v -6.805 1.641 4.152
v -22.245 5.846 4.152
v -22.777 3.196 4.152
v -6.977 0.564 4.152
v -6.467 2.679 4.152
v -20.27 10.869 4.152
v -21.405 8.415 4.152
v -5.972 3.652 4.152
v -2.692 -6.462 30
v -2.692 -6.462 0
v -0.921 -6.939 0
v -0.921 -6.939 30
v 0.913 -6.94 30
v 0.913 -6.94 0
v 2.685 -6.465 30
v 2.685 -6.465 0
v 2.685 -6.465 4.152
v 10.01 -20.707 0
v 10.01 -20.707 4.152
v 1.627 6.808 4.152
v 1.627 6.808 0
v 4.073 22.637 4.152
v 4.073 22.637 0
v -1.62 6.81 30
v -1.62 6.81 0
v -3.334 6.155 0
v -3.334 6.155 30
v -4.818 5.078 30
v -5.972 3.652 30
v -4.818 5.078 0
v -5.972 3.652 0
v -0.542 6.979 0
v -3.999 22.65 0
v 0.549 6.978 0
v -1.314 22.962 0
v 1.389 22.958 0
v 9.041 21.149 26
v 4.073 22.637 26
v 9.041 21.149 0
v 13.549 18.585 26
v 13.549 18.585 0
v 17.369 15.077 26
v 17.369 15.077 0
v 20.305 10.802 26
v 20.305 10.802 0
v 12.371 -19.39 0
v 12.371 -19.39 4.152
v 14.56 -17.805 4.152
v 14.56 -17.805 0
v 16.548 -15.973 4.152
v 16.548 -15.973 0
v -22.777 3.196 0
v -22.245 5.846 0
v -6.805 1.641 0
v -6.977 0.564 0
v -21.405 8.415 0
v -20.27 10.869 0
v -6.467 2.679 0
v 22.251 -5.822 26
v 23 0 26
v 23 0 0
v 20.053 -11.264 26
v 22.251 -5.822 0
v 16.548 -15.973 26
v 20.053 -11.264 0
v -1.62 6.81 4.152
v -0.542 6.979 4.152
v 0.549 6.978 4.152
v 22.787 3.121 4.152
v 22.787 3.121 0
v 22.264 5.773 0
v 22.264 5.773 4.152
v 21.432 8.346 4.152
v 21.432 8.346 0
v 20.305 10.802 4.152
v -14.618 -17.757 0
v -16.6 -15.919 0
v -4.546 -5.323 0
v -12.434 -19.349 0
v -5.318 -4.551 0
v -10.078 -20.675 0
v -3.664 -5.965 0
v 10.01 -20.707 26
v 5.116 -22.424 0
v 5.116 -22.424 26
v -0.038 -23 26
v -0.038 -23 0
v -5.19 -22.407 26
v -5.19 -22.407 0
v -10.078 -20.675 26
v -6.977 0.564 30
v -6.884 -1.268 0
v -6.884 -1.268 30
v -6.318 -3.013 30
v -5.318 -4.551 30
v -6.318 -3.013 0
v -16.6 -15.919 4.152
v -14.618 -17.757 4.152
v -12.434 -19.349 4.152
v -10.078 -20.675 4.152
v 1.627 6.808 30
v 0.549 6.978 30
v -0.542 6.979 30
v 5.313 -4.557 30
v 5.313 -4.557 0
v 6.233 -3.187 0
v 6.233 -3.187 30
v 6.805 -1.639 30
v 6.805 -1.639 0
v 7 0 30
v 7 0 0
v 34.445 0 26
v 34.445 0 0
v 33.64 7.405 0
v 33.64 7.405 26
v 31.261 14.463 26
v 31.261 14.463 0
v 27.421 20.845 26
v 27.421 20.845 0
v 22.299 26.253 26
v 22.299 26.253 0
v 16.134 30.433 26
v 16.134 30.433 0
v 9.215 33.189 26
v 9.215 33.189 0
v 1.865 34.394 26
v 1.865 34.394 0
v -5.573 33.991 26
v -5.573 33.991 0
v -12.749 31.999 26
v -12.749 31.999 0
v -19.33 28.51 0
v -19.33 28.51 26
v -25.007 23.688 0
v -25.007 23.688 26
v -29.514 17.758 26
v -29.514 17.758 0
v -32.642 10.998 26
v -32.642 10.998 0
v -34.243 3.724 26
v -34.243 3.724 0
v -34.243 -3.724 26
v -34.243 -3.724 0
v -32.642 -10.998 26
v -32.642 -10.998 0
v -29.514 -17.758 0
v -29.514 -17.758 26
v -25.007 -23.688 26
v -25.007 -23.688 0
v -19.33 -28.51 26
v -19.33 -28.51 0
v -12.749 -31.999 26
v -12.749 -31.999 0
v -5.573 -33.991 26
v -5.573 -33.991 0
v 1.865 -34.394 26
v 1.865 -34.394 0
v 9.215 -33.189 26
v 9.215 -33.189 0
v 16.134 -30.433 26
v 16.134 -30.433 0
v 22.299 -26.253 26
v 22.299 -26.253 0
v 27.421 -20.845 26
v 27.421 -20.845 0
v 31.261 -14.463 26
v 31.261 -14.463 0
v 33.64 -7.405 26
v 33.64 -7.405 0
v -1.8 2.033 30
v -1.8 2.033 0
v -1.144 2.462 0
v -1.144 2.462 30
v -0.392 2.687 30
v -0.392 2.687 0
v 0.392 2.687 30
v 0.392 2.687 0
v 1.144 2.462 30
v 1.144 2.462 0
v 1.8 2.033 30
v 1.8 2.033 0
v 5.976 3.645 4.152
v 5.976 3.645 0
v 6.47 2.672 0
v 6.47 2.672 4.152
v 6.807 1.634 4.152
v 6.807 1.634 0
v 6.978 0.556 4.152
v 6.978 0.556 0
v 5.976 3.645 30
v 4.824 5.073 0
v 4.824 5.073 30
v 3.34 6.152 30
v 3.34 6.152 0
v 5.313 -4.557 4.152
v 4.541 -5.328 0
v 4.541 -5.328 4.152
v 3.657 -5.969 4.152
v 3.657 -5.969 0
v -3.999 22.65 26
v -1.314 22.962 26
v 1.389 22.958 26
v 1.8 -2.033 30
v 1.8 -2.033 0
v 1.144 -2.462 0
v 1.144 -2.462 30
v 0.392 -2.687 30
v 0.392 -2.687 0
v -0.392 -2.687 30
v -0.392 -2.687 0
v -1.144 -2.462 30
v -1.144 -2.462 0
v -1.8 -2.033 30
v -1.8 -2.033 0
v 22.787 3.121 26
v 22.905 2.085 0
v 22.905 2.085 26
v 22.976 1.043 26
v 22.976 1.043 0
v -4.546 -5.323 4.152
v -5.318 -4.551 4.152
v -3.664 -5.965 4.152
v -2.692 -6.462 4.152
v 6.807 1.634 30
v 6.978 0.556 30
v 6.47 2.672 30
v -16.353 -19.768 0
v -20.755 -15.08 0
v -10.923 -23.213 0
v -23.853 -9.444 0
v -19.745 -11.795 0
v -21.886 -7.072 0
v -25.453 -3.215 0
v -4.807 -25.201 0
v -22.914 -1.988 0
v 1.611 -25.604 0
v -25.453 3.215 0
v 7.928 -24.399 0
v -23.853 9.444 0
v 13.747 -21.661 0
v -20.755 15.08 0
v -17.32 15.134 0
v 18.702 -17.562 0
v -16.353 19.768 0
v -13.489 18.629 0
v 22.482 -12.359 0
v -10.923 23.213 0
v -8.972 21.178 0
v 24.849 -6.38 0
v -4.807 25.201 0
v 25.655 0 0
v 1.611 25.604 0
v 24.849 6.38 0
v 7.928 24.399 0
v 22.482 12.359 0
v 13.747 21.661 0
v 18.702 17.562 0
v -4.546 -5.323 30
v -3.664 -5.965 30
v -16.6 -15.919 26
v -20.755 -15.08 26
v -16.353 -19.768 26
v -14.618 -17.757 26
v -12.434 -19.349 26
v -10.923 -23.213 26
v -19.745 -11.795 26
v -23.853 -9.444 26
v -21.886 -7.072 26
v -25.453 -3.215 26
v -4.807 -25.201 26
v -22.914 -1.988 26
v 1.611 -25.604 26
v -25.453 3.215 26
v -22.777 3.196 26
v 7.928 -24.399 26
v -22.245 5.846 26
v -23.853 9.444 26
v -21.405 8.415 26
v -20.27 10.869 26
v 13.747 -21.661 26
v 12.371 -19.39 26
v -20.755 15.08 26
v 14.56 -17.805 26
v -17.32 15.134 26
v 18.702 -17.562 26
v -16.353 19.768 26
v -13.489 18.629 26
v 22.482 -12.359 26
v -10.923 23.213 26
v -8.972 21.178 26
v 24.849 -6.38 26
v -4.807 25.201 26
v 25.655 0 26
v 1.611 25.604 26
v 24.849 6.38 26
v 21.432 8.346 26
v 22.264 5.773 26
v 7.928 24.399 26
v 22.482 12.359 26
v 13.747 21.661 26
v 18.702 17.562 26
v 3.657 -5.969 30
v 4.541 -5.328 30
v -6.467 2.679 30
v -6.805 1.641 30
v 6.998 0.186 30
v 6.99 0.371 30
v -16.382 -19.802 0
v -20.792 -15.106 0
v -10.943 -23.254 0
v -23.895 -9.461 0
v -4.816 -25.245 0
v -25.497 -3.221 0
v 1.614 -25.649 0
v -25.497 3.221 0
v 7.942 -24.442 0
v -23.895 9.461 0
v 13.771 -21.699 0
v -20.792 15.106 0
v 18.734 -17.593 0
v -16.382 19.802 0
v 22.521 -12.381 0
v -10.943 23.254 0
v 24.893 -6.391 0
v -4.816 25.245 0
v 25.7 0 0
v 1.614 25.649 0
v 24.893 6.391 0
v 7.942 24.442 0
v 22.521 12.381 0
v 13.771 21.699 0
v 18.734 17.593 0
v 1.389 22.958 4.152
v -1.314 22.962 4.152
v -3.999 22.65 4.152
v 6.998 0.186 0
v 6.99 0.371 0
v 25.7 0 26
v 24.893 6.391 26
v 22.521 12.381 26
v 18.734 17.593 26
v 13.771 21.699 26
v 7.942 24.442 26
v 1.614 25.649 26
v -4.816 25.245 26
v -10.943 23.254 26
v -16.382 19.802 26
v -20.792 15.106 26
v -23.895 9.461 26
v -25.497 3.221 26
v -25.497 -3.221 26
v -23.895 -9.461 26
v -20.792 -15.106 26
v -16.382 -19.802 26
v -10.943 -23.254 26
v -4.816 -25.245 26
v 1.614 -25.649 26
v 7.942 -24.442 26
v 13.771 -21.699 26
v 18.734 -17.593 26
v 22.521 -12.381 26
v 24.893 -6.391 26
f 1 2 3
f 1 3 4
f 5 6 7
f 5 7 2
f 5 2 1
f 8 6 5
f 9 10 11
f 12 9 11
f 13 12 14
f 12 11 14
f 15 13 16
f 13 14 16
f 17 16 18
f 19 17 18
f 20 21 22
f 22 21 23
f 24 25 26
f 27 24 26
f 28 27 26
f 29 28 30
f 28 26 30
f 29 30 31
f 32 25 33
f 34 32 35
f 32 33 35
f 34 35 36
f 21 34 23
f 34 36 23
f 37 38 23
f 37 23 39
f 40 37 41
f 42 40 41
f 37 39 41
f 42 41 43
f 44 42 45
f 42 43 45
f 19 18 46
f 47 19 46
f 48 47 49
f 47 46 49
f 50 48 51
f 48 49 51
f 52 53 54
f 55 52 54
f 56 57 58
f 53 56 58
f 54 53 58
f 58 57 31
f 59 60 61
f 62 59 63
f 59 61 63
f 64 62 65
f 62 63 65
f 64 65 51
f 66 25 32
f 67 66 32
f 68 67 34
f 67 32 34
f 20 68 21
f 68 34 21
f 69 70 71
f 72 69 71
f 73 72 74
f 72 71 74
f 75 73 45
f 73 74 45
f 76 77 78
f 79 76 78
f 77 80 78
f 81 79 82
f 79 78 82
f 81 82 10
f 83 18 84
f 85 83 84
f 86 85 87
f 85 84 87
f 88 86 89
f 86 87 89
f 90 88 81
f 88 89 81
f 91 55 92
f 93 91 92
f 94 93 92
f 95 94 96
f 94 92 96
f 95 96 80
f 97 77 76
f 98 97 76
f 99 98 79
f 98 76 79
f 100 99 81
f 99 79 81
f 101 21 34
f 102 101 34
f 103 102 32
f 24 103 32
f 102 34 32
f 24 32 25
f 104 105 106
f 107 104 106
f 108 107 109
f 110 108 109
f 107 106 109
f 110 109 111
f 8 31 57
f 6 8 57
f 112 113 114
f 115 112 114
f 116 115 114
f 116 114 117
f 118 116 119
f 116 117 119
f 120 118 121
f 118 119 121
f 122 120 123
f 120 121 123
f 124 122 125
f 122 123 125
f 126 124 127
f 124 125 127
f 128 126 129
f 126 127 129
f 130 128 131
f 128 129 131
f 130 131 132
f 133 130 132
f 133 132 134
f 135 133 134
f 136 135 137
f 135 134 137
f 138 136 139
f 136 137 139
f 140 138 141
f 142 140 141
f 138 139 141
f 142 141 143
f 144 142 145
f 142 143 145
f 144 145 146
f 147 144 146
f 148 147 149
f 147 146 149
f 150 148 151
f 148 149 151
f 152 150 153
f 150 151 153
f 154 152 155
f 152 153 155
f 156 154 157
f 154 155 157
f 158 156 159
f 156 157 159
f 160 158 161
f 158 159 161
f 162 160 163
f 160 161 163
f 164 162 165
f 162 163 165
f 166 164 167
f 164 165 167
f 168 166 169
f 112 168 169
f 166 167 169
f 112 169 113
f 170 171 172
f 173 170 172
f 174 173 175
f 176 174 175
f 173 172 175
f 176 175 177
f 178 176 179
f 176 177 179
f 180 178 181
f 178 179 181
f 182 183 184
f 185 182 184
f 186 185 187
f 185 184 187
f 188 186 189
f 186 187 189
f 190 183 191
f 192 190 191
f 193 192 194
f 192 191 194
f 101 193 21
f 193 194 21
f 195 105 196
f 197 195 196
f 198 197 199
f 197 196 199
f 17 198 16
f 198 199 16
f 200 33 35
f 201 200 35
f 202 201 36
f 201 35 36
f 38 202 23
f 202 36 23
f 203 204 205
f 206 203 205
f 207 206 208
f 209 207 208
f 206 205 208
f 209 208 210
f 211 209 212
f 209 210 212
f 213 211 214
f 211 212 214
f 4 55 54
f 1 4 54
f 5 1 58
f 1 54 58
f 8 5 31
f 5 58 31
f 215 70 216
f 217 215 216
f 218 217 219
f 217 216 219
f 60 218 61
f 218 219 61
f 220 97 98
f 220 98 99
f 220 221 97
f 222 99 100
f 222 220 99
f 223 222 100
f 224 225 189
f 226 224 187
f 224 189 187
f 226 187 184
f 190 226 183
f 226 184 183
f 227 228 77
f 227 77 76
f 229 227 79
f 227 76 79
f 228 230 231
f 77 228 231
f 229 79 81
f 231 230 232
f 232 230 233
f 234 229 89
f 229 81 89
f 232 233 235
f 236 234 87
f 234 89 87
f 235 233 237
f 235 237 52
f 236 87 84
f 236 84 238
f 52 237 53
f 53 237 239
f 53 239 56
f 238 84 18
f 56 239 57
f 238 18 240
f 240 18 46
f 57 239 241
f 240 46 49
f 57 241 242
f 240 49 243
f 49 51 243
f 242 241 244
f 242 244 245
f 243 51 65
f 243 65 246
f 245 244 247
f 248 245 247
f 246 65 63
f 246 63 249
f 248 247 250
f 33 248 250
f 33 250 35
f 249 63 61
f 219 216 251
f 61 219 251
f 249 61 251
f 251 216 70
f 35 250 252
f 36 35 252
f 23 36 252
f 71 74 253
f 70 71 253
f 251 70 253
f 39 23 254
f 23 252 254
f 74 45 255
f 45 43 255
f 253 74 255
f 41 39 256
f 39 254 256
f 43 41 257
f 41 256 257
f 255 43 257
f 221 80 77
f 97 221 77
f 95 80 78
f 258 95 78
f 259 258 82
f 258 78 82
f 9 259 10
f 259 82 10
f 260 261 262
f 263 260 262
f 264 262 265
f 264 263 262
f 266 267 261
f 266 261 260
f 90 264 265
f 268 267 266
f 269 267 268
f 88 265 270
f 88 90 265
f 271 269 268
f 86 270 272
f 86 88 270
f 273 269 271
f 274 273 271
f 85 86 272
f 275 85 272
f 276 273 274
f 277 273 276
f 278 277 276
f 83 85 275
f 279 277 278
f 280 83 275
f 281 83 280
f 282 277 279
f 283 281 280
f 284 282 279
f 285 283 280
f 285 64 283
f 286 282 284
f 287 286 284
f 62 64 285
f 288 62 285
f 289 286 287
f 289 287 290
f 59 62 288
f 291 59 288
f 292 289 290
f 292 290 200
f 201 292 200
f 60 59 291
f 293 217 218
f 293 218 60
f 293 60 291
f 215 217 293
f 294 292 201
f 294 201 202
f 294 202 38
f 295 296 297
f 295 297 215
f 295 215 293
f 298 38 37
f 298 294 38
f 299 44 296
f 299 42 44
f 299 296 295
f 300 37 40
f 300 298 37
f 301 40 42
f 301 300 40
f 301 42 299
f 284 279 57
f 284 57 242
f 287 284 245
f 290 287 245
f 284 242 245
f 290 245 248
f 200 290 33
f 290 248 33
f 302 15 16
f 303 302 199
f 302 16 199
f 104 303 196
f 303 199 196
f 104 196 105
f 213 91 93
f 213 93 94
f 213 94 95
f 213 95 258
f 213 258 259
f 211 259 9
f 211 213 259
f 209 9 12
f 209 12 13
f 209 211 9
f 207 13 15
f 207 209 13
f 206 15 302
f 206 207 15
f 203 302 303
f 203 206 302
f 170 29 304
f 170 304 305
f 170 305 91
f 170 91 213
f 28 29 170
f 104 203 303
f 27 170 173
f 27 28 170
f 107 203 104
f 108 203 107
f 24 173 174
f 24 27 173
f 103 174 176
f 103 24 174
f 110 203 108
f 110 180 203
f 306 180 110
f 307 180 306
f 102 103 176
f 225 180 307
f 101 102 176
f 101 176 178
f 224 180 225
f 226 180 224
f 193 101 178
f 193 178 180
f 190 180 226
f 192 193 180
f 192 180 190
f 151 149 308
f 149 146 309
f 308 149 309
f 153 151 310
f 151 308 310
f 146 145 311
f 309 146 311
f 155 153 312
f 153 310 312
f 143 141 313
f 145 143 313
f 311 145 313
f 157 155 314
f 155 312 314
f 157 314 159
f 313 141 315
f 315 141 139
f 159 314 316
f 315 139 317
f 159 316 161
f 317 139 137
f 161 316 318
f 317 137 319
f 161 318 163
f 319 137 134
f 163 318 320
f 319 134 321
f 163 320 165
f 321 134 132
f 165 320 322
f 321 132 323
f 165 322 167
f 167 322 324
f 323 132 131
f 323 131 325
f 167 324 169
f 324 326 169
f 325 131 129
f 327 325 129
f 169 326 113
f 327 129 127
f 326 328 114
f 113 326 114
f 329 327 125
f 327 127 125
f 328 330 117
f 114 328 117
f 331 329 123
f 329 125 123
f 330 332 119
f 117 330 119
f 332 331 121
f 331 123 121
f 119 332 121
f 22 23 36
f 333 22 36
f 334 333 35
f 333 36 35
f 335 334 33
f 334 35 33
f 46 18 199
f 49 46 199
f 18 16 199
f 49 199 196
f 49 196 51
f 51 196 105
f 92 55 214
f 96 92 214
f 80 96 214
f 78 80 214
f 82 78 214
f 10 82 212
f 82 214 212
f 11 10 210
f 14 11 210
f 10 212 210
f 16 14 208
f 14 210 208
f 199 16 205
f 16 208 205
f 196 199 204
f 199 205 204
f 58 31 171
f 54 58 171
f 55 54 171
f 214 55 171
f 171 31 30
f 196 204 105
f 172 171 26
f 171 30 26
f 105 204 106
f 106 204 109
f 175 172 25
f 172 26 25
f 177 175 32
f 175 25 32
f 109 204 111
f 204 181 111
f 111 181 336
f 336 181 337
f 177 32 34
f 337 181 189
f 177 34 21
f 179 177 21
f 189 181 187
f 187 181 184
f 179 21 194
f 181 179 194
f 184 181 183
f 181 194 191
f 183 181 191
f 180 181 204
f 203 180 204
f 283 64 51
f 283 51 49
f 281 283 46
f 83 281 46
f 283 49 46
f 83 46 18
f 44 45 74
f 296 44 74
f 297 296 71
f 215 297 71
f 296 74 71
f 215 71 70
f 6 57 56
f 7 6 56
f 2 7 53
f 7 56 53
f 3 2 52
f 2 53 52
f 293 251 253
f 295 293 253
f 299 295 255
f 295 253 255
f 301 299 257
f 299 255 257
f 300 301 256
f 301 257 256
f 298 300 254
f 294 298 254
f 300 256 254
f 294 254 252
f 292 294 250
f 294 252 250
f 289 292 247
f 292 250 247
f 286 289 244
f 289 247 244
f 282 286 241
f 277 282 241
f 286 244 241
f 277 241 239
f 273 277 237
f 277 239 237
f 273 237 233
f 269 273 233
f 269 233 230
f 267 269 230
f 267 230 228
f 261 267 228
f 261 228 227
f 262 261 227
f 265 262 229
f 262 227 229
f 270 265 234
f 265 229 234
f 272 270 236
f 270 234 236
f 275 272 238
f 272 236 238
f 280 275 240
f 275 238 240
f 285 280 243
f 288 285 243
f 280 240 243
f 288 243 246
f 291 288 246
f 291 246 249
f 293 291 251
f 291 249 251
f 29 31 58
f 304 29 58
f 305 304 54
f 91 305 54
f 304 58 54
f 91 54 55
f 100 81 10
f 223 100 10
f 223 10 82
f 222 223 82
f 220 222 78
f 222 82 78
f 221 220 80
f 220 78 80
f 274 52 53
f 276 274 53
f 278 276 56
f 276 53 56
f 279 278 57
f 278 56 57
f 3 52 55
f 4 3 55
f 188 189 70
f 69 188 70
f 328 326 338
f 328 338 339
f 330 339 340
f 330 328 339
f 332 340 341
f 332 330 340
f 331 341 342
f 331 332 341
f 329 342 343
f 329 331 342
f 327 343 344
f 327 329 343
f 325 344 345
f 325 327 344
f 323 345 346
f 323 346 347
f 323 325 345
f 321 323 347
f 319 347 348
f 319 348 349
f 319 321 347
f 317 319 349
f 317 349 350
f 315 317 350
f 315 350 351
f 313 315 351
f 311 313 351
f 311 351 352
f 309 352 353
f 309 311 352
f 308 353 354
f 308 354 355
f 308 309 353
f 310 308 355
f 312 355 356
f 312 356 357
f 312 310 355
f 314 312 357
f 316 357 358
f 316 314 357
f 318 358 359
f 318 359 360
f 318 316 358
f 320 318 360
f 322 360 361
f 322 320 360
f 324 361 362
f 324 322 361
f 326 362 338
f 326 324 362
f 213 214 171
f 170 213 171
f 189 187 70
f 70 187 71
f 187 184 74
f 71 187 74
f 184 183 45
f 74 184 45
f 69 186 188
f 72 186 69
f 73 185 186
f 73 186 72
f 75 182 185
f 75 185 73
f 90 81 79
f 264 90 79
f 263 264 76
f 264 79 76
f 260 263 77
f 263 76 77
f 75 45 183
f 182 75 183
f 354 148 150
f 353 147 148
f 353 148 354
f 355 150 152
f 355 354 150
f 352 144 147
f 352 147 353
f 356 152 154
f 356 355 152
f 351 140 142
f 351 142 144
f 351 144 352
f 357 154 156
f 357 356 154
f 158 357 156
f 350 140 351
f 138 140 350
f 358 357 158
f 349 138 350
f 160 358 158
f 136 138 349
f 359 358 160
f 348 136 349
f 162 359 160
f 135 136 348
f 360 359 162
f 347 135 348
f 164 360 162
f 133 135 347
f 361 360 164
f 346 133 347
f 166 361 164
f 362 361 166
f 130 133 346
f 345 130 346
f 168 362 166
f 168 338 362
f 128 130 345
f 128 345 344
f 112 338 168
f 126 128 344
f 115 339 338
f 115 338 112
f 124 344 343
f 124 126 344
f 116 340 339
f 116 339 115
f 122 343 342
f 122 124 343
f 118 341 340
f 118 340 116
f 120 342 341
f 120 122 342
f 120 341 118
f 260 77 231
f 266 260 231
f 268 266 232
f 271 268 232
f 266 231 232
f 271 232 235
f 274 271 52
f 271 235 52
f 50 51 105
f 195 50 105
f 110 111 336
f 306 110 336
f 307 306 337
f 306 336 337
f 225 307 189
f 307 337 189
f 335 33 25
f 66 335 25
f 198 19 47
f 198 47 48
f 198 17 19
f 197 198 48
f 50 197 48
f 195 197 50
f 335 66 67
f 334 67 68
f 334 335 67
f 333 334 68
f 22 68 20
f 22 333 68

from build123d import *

# Parameters (mm, degrees)
F2_DEPTH = 30
F0_R     = 25.655
F3_DEPTH = 26
F4_DEPTH = 4.15156
F1_R     = 34.445
F1_R_2   = 25.7
F5_DEPTH = 26


with BuildPart() as f2:
    # F0 (on Top) → F2 (new body)
    with BuildSketch(Plane.XY):
        with BuildLine():
            ThreePointArc((7, 0), (6.994466, 0.278279), (6.977875, 0.556118))
            ThreePointArc((6.977875, 0.556118), (6.658558, 2.159539), (5.976021, 3.645158))
            ThreePointArc((5.976021, 3.645158), (4.117541, 5.660906), (1.627382, 6.808203))
            ThreePointArc((1.627382, 6.808203), (0.003764, 6.999999), (-1.62006, 6.809949))
            ThreePointArc((-1.62006, 6.809949), (-4.111451, 5.665331), (-5.972097, 3.651583))
            ThreePointArc((-5.972097, 3.651583), (-6.656231, 2.166699), (-6.977272, 0.563622))
            ThreePointArc((-6.977272, 0.563622), (-6.658558, -2.159539), (-5.318341, -4.5514))
            ThreePointArc((-5.318341, -4.5514), (-4.117541, -5.660906), (-2.692132, -6.461612))
            ThreePointArc((-2.692132, -6.461612), (-0.003764, -6.999999), (2.685181, -6.464503))
            ThreePointArc((2.685181, -6.464503), (4.111451, -5.665331), (5.313443, -4.557117))
            ThreePointArc((5.313443, -4.557117), (6.564834, -2.429598), (7, 0))
        make_face()
        with BuildLine():
            ThreePointArc((1.8, -2.032542), (0, -2.715), (-1.8, -2.032542))
            Line((-1.8, -2.032542), (-1.8, 2.032542))
            ThreePointArc((-1.8, 2.032542), (0, 2.715), (1.8, 2.032542))
            Line((1.8, 2.032542), (1.8, -2.032542))
        make_face(mode=Mode.SUBTRACT)
    extrude(amount=F2_DEPTH)


with BuildPart() as f3:
    # F0 (on Top) → F3 (new body)
    with BuildSketch(Plane.XY):
        Circle(F0_R)
        with BuildLine():
            ThreePointArc((22.787196, 3.121491), (22.946737, 1.564368), (23, 0))
            ThreePointArc((23, 0), (21.326207, -8.61353), (16.548444, -15.973384))
            ThreePointArc((16.548444, -15.973384), (13.488694, -18.629416), (10.010345, -20.707317))
            ThreePointArc((10.010345, -20.707317), (-0.037514, -22.999969), (-10.07784, -20.674553))
            ThreePointArc((-10.07784, -20.674553), (-13.549392, -18.585316), (-16.600462, -15.919317))
            ThreePointArc((-16.600462, -15.919317), (-21.885863, -7.071704), (-22.776892, 3.195807))
            ThreePointArc((-22.776892, 3.195807), (-21.862678, 7.143059), (-20.269995, 10.868638))
            ThreePointArc((-20.269995, 10.868638), (-13.488694, 18.629416), (-3.999053, 22.64967))
            ThreePointArc((-3.999053, 22.64967), (0.037514, 22.999969), (4.072916, 22.636505))
            ThreePointArc((4.072916, 22.636505), (13.549392, 18.585316), (20.305341, 10.802459))
            ThreePointArc((20.305341, 10.802459), (21.885863, 7.071704), (22.787196, 3.121491))
        make_face(mode=Mode.SUBTRACT)
    extrude(amount=F3_DEPTH)


with BuildPart() as f4:
    # F0 (on Top) → F4 (new body)
    with BuildSketch(Plane.XY):
        with BuildLine():
            Line((1.627382, 6.808203), (4.072916, 22.636505))
            ThreePointArc((4.072916, 22.636505), (0.037514, 22.999969), (-3.999053, 22.64967))
            Line((-3.999053, 22.64967), (-1.62006, 6.809949))
            ThreePointArc((-1.62006, 6.809949), (0.003764, 6.999999), (1.627382, 6.808203))
        make_face()
        with BuildLine():
            ThreePointArc((10.010345, -20.707317), (13.488694, -18.629416), (16.548444, -15.973384))
            Line((16.548444, -15.973384), (5.313443, -4.557117))
            ThreePointArc((5.313443, -4.557117), (4.111451, -5.665331), (2.685181, -6.464503))
            Line((2.685181, -6.464503), (10.010345, -20.707317))
        make_face()
        with BuildLine():
            ThreePointArc((-16.600462, -15.919317), (-13.549392, -18.585316), (-10.07784, -20.674553))
            Line((-10.07784, -20.674553), (-2.692132, -6.461612))
            ThreePointArc((-2.692132, -6.461612), (-4.117541, -5.660906), (-5.318341, -4.5514))
            Line((-5.318341, -4.5514), (-16.600462, -15.919317))
        make_face()
        with BuildLine():
            Line((-5.972097, 3.651583), (-20.269995, 10.868638))
            ThreePointArc((-20.269995, 10.868638), (-21.862678, 7.143059), (-22.776892, 3.195807))
            Line((-22.776892, 3.195807), (-6.977272, 0.563622))
            ThreePointArc((-6.977272, 0.563622), (-6.656231, 2.166699), (-5.972097, 3.651583))
        make_face()
        with BuildLine():
            Line((6.977875, 0.556118), (22.787196, 3.121491))
            ThreePointArc((22.787196, 3.121491), (21.885863, 7.071704), (20.305341, 10.802459))
            Line((20.305341, 10.802459), (5.976021, 3.645158))
            ThreePointArc((5.976021, 3.645158), (6.658558, 2.159539), (6.977875, 0.556118))
        make_face()
    extrude(amount=F4_DEPTH)


with BuildPart() as f5:
    # F1 (on Top) → F5 (new body)
    with BuildSketch(Plane.XY):
        Circle(F1_R)
        Circle(F1_R_2, mode=Mode.SUBTRACT)
    extrude(amount=F5_DEPTH)


solid = Compound([f2.part, f3.part, f4.part, f5.part])
